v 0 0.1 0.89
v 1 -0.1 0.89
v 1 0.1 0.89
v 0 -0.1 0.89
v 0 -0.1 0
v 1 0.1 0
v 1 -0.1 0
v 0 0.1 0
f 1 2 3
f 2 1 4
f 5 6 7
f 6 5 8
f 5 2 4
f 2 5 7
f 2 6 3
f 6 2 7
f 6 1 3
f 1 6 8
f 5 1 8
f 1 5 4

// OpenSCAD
color([0.3, 0.3, 0.5])
translate([0,-0.1,0])
// .90 would be coincident with the roof surface
cube([1, .2, .89], false);
